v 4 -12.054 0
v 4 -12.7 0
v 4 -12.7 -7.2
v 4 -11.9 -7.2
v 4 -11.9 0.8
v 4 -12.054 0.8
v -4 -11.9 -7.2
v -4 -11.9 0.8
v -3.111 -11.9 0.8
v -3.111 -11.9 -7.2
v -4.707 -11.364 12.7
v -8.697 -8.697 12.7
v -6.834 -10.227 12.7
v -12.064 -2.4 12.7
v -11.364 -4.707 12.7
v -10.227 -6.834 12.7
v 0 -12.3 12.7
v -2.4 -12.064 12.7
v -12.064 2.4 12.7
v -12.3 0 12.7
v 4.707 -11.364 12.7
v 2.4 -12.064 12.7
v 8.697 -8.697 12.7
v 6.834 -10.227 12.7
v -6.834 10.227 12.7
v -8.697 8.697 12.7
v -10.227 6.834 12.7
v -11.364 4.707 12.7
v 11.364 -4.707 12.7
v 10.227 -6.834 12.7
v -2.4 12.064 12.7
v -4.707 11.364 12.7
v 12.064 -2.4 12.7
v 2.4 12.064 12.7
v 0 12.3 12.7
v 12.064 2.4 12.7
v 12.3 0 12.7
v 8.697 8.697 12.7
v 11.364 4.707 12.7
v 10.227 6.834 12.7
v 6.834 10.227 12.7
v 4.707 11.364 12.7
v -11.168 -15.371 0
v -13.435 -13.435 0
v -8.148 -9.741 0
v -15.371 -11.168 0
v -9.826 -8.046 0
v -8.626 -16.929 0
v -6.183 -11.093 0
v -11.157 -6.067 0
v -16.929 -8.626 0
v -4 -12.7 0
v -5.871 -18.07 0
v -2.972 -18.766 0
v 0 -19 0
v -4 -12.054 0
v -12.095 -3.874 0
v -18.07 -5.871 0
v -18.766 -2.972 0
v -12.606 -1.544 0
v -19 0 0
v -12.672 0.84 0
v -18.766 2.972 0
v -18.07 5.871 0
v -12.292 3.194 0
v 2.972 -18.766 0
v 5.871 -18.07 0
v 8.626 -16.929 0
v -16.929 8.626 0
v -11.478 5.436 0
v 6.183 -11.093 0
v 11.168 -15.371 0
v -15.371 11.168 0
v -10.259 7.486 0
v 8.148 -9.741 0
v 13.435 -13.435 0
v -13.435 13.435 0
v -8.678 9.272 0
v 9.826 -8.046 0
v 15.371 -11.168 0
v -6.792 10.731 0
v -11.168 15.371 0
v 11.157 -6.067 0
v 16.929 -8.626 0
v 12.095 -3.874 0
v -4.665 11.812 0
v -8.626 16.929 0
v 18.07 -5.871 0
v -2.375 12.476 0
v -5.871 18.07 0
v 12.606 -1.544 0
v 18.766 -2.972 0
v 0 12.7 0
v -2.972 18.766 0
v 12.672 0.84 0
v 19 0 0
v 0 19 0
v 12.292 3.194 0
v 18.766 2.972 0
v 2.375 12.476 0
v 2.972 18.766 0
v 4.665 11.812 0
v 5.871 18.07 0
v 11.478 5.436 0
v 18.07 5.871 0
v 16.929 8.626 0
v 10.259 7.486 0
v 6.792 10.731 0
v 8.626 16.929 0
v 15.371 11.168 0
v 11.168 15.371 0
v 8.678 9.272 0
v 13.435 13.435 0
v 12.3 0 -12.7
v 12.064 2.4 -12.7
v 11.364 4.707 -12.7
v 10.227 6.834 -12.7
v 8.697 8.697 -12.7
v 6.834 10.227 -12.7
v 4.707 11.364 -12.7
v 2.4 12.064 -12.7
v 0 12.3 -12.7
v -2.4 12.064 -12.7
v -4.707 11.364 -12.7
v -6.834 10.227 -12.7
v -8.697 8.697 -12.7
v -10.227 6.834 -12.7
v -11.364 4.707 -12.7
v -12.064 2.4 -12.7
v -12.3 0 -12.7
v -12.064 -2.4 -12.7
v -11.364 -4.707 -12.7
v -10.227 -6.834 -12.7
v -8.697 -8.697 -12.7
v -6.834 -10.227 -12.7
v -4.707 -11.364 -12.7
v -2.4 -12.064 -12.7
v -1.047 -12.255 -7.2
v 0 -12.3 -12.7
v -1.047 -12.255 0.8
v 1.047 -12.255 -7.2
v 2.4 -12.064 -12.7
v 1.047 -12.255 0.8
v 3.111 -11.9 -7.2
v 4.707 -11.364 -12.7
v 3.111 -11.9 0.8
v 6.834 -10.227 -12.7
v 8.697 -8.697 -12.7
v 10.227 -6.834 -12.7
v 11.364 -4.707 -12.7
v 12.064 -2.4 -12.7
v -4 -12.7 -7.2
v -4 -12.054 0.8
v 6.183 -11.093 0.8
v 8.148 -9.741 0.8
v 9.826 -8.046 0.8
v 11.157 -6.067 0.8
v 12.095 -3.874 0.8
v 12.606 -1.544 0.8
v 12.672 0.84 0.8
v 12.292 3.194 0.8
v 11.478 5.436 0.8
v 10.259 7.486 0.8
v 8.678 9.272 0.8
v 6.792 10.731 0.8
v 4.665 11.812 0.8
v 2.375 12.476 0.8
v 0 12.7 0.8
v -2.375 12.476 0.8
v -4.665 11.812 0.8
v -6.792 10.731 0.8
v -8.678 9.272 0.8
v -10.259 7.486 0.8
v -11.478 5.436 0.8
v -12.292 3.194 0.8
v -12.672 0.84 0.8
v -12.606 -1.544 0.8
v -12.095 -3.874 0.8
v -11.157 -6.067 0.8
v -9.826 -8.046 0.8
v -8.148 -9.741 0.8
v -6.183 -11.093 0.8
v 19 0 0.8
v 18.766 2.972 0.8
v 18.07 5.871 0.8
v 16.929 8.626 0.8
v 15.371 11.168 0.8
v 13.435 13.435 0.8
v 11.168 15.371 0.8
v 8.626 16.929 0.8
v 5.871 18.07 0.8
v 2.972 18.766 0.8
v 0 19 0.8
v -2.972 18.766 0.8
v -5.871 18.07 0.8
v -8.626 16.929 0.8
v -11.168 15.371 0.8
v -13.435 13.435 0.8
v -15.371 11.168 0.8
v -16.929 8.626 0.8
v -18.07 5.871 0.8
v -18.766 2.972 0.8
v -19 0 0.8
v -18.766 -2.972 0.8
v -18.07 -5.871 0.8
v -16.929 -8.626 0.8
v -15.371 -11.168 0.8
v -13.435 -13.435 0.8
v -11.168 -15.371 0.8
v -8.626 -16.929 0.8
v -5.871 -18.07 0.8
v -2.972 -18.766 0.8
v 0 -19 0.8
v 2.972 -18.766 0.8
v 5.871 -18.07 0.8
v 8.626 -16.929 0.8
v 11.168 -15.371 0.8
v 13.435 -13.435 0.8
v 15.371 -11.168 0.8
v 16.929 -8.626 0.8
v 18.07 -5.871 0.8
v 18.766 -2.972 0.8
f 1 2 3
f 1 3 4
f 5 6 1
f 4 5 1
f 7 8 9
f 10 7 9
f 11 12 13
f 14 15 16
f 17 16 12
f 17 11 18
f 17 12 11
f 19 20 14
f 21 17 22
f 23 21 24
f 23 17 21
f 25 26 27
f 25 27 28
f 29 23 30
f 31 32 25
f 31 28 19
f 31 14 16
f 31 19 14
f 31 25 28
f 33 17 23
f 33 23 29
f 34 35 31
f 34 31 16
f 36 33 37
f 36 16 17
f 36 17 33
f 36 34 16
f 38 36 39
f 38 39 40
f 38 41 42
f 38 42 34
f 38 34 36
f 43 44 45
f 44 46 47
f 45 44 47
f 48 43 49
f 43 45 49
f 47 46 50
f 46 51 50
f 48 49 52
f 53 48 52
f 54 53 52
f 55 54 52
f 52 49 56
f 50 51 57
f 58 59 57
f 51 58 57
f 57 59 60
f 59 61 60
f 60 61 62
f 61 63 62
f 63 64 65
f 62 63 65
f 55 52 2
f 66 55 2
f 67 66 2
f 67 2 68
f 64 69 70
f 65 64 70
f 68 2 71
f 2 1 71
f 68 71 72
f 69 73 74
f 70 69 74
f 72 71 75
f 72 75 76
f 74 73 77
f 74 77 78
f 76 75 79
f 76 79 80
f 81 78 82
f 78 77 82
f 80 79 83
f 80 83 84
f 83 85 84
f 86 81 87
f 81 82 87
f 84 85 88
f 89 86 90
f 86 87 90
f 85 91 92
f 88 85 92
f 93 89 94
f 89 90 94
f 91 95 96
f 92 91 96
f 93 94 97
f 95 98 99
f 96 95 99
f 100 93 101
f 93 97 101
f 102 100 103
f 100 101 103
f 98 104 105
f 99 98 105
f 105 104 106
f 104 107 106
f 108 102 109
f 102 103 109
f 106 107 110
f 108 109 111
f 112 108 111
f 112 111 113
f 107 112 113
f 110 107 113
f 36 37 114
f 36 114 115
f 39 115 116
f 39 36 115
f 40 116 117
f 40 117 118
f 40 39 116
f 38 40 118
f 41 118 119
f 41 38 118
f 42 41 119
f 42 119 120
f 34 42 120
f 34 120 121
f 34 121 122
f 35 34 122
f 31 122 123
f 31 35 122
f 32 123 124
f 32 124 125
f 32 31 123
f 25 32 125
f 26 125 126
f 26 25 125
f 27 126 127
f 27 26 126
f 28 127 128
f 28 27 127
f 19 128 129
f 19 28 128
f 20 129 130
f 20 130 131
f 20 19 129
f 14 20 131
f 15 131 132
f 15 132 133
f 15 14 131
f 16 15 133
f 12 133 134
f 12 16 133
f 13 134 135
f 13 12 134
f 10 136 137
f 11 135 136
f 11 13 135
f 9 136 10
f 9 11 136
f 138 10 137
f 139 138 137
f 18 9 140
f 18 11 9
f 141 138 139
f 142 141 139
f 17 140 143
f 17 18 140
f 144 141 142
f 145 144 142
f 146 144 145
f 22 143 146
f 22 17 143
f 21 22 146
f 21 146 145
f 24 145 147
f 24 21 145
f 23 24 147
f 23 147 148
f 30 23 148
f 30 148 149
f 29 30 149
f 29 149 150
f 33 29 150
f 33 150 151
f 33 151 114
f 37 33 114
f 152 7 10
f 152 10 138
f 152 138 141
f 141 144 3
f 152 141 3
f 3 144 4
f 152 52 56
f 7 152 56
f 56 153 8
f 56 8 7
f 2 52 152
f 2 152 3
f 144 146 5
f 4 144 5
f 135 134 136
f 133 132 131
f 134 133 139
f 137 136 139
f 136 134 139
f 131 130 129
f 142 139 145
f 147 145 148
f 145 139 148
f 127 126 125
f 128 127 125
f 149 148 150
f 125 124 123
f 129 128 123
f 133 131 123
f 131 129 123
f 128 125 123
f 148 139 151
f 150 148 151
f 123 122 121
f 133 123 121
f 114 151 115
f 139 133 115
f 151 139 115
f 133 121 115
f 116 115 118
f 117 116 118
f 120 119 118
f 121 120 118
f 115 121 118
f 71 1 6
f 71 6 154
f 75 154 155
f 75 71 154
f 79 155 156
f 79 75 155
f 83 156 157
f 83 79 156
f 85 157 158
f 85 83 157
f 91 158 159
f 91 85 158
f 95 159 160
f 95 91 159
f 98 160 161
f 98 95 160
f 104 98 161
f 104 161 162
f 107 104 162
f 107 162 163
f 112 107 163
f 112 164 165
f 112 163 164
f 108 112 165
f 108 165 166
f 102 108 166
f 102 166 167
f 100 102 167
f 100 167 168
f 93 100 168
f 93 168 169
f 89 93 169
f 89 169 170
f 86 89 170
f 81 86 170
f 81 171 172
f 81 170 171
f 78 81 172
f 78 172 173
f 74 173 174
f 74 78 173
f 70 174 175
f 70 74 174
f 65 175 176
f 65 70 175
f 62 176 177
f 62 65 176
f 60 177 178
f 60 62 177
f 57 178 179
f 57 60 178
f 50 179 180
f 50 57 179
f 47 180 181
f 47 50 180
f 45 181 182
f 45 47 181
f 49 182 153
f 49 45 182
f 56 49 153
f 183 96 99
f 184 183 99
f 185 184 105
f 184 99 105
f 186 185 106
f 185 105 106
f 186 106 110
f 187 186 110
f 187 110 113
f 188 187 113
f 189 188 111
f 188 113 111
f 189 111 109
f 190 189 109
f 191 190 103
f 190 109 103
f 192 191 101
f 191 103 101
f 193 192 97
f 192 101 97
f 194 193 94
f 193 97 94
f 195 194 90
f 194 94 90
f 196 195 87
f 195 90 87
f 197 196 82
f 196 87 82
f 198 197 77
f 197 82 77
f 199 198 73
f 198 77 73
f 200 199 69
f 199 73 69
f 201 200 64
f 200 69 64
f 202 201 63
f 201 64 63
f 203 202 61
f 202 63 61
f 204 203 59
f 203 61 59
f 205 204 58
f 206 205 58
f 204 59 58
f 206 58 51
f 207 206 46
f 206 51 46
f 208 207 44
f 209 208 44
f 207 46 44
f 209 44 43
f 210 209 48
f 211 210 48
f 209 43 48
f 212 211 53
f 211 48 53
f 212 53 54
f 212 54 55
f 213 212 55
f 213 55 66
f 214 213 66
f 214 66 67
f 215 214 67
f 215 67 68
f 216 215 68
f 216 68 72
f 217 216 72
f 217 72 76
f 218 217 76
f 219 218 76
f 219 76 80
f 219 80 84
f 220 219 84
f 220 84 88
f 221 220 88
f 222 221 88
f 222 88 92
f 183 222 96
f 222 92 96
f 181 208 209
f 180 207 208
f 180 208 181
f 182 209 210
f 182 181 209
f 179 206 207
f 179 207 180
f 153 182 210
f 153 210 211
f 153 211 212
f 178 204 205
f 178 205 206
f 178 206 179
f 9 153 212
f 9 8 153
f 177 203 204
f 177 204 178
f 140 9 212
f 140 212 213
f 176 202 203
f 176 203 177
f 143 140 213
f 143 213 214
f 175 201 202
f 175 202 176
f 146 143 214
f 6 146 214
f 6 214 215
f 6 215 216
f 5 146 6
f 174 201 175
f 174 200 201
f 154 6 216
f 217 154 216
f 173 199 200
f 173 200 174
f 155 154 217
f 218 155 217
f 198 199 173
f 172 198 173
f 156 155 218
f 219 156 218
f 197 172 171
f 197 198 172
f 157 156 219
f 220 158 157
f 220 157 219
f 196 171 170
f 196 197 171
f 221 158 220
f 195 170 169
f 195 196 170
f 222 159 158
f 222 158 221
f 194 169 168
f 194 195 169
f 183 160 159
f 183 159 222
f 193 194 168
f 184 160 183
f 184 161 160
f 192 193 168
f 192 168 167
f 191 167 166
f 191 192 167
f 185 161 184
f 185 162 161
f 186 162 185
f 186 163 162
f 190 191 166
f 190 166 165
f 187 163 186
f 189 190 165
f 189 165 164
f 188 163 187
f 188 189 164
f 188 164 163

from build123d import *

# Parameters (mm, degrees)
F0_R     = 19
F0_R_2   = 12.7
F1_DEPTH = 0.8
F2_W     = 8
F2_H     = 0.8
F3_DEPTH = 8
F4_R     = 12.3
F5_DEPTH = 12.7


with BuildPart() as f1:
    # F0 (on Top) → F1 (new body)
    with BuildSketch(Plane.XY):
        Circle(F0_R)
        Circle(F0_R_2, mode=Mode.SUBTRACT)
    extrude(amount=F1_DEPTH)

    # F2 (on face) → F3 (join)
    with BuildSketch(Plane.XY.offset(0.8)):
        with Locations((0, -12.3)):
            Rectangle(F2_W, F2_H)
    extrude(amount=-F3_DEPTH)

    # F4 (on Top) → F5 (join, symmetric)
    with BuildSketch(Plane.XY):
        Circle(F4_R)
    extrude(amount=F5_DEPTH, both=True)


solid = f1.part
